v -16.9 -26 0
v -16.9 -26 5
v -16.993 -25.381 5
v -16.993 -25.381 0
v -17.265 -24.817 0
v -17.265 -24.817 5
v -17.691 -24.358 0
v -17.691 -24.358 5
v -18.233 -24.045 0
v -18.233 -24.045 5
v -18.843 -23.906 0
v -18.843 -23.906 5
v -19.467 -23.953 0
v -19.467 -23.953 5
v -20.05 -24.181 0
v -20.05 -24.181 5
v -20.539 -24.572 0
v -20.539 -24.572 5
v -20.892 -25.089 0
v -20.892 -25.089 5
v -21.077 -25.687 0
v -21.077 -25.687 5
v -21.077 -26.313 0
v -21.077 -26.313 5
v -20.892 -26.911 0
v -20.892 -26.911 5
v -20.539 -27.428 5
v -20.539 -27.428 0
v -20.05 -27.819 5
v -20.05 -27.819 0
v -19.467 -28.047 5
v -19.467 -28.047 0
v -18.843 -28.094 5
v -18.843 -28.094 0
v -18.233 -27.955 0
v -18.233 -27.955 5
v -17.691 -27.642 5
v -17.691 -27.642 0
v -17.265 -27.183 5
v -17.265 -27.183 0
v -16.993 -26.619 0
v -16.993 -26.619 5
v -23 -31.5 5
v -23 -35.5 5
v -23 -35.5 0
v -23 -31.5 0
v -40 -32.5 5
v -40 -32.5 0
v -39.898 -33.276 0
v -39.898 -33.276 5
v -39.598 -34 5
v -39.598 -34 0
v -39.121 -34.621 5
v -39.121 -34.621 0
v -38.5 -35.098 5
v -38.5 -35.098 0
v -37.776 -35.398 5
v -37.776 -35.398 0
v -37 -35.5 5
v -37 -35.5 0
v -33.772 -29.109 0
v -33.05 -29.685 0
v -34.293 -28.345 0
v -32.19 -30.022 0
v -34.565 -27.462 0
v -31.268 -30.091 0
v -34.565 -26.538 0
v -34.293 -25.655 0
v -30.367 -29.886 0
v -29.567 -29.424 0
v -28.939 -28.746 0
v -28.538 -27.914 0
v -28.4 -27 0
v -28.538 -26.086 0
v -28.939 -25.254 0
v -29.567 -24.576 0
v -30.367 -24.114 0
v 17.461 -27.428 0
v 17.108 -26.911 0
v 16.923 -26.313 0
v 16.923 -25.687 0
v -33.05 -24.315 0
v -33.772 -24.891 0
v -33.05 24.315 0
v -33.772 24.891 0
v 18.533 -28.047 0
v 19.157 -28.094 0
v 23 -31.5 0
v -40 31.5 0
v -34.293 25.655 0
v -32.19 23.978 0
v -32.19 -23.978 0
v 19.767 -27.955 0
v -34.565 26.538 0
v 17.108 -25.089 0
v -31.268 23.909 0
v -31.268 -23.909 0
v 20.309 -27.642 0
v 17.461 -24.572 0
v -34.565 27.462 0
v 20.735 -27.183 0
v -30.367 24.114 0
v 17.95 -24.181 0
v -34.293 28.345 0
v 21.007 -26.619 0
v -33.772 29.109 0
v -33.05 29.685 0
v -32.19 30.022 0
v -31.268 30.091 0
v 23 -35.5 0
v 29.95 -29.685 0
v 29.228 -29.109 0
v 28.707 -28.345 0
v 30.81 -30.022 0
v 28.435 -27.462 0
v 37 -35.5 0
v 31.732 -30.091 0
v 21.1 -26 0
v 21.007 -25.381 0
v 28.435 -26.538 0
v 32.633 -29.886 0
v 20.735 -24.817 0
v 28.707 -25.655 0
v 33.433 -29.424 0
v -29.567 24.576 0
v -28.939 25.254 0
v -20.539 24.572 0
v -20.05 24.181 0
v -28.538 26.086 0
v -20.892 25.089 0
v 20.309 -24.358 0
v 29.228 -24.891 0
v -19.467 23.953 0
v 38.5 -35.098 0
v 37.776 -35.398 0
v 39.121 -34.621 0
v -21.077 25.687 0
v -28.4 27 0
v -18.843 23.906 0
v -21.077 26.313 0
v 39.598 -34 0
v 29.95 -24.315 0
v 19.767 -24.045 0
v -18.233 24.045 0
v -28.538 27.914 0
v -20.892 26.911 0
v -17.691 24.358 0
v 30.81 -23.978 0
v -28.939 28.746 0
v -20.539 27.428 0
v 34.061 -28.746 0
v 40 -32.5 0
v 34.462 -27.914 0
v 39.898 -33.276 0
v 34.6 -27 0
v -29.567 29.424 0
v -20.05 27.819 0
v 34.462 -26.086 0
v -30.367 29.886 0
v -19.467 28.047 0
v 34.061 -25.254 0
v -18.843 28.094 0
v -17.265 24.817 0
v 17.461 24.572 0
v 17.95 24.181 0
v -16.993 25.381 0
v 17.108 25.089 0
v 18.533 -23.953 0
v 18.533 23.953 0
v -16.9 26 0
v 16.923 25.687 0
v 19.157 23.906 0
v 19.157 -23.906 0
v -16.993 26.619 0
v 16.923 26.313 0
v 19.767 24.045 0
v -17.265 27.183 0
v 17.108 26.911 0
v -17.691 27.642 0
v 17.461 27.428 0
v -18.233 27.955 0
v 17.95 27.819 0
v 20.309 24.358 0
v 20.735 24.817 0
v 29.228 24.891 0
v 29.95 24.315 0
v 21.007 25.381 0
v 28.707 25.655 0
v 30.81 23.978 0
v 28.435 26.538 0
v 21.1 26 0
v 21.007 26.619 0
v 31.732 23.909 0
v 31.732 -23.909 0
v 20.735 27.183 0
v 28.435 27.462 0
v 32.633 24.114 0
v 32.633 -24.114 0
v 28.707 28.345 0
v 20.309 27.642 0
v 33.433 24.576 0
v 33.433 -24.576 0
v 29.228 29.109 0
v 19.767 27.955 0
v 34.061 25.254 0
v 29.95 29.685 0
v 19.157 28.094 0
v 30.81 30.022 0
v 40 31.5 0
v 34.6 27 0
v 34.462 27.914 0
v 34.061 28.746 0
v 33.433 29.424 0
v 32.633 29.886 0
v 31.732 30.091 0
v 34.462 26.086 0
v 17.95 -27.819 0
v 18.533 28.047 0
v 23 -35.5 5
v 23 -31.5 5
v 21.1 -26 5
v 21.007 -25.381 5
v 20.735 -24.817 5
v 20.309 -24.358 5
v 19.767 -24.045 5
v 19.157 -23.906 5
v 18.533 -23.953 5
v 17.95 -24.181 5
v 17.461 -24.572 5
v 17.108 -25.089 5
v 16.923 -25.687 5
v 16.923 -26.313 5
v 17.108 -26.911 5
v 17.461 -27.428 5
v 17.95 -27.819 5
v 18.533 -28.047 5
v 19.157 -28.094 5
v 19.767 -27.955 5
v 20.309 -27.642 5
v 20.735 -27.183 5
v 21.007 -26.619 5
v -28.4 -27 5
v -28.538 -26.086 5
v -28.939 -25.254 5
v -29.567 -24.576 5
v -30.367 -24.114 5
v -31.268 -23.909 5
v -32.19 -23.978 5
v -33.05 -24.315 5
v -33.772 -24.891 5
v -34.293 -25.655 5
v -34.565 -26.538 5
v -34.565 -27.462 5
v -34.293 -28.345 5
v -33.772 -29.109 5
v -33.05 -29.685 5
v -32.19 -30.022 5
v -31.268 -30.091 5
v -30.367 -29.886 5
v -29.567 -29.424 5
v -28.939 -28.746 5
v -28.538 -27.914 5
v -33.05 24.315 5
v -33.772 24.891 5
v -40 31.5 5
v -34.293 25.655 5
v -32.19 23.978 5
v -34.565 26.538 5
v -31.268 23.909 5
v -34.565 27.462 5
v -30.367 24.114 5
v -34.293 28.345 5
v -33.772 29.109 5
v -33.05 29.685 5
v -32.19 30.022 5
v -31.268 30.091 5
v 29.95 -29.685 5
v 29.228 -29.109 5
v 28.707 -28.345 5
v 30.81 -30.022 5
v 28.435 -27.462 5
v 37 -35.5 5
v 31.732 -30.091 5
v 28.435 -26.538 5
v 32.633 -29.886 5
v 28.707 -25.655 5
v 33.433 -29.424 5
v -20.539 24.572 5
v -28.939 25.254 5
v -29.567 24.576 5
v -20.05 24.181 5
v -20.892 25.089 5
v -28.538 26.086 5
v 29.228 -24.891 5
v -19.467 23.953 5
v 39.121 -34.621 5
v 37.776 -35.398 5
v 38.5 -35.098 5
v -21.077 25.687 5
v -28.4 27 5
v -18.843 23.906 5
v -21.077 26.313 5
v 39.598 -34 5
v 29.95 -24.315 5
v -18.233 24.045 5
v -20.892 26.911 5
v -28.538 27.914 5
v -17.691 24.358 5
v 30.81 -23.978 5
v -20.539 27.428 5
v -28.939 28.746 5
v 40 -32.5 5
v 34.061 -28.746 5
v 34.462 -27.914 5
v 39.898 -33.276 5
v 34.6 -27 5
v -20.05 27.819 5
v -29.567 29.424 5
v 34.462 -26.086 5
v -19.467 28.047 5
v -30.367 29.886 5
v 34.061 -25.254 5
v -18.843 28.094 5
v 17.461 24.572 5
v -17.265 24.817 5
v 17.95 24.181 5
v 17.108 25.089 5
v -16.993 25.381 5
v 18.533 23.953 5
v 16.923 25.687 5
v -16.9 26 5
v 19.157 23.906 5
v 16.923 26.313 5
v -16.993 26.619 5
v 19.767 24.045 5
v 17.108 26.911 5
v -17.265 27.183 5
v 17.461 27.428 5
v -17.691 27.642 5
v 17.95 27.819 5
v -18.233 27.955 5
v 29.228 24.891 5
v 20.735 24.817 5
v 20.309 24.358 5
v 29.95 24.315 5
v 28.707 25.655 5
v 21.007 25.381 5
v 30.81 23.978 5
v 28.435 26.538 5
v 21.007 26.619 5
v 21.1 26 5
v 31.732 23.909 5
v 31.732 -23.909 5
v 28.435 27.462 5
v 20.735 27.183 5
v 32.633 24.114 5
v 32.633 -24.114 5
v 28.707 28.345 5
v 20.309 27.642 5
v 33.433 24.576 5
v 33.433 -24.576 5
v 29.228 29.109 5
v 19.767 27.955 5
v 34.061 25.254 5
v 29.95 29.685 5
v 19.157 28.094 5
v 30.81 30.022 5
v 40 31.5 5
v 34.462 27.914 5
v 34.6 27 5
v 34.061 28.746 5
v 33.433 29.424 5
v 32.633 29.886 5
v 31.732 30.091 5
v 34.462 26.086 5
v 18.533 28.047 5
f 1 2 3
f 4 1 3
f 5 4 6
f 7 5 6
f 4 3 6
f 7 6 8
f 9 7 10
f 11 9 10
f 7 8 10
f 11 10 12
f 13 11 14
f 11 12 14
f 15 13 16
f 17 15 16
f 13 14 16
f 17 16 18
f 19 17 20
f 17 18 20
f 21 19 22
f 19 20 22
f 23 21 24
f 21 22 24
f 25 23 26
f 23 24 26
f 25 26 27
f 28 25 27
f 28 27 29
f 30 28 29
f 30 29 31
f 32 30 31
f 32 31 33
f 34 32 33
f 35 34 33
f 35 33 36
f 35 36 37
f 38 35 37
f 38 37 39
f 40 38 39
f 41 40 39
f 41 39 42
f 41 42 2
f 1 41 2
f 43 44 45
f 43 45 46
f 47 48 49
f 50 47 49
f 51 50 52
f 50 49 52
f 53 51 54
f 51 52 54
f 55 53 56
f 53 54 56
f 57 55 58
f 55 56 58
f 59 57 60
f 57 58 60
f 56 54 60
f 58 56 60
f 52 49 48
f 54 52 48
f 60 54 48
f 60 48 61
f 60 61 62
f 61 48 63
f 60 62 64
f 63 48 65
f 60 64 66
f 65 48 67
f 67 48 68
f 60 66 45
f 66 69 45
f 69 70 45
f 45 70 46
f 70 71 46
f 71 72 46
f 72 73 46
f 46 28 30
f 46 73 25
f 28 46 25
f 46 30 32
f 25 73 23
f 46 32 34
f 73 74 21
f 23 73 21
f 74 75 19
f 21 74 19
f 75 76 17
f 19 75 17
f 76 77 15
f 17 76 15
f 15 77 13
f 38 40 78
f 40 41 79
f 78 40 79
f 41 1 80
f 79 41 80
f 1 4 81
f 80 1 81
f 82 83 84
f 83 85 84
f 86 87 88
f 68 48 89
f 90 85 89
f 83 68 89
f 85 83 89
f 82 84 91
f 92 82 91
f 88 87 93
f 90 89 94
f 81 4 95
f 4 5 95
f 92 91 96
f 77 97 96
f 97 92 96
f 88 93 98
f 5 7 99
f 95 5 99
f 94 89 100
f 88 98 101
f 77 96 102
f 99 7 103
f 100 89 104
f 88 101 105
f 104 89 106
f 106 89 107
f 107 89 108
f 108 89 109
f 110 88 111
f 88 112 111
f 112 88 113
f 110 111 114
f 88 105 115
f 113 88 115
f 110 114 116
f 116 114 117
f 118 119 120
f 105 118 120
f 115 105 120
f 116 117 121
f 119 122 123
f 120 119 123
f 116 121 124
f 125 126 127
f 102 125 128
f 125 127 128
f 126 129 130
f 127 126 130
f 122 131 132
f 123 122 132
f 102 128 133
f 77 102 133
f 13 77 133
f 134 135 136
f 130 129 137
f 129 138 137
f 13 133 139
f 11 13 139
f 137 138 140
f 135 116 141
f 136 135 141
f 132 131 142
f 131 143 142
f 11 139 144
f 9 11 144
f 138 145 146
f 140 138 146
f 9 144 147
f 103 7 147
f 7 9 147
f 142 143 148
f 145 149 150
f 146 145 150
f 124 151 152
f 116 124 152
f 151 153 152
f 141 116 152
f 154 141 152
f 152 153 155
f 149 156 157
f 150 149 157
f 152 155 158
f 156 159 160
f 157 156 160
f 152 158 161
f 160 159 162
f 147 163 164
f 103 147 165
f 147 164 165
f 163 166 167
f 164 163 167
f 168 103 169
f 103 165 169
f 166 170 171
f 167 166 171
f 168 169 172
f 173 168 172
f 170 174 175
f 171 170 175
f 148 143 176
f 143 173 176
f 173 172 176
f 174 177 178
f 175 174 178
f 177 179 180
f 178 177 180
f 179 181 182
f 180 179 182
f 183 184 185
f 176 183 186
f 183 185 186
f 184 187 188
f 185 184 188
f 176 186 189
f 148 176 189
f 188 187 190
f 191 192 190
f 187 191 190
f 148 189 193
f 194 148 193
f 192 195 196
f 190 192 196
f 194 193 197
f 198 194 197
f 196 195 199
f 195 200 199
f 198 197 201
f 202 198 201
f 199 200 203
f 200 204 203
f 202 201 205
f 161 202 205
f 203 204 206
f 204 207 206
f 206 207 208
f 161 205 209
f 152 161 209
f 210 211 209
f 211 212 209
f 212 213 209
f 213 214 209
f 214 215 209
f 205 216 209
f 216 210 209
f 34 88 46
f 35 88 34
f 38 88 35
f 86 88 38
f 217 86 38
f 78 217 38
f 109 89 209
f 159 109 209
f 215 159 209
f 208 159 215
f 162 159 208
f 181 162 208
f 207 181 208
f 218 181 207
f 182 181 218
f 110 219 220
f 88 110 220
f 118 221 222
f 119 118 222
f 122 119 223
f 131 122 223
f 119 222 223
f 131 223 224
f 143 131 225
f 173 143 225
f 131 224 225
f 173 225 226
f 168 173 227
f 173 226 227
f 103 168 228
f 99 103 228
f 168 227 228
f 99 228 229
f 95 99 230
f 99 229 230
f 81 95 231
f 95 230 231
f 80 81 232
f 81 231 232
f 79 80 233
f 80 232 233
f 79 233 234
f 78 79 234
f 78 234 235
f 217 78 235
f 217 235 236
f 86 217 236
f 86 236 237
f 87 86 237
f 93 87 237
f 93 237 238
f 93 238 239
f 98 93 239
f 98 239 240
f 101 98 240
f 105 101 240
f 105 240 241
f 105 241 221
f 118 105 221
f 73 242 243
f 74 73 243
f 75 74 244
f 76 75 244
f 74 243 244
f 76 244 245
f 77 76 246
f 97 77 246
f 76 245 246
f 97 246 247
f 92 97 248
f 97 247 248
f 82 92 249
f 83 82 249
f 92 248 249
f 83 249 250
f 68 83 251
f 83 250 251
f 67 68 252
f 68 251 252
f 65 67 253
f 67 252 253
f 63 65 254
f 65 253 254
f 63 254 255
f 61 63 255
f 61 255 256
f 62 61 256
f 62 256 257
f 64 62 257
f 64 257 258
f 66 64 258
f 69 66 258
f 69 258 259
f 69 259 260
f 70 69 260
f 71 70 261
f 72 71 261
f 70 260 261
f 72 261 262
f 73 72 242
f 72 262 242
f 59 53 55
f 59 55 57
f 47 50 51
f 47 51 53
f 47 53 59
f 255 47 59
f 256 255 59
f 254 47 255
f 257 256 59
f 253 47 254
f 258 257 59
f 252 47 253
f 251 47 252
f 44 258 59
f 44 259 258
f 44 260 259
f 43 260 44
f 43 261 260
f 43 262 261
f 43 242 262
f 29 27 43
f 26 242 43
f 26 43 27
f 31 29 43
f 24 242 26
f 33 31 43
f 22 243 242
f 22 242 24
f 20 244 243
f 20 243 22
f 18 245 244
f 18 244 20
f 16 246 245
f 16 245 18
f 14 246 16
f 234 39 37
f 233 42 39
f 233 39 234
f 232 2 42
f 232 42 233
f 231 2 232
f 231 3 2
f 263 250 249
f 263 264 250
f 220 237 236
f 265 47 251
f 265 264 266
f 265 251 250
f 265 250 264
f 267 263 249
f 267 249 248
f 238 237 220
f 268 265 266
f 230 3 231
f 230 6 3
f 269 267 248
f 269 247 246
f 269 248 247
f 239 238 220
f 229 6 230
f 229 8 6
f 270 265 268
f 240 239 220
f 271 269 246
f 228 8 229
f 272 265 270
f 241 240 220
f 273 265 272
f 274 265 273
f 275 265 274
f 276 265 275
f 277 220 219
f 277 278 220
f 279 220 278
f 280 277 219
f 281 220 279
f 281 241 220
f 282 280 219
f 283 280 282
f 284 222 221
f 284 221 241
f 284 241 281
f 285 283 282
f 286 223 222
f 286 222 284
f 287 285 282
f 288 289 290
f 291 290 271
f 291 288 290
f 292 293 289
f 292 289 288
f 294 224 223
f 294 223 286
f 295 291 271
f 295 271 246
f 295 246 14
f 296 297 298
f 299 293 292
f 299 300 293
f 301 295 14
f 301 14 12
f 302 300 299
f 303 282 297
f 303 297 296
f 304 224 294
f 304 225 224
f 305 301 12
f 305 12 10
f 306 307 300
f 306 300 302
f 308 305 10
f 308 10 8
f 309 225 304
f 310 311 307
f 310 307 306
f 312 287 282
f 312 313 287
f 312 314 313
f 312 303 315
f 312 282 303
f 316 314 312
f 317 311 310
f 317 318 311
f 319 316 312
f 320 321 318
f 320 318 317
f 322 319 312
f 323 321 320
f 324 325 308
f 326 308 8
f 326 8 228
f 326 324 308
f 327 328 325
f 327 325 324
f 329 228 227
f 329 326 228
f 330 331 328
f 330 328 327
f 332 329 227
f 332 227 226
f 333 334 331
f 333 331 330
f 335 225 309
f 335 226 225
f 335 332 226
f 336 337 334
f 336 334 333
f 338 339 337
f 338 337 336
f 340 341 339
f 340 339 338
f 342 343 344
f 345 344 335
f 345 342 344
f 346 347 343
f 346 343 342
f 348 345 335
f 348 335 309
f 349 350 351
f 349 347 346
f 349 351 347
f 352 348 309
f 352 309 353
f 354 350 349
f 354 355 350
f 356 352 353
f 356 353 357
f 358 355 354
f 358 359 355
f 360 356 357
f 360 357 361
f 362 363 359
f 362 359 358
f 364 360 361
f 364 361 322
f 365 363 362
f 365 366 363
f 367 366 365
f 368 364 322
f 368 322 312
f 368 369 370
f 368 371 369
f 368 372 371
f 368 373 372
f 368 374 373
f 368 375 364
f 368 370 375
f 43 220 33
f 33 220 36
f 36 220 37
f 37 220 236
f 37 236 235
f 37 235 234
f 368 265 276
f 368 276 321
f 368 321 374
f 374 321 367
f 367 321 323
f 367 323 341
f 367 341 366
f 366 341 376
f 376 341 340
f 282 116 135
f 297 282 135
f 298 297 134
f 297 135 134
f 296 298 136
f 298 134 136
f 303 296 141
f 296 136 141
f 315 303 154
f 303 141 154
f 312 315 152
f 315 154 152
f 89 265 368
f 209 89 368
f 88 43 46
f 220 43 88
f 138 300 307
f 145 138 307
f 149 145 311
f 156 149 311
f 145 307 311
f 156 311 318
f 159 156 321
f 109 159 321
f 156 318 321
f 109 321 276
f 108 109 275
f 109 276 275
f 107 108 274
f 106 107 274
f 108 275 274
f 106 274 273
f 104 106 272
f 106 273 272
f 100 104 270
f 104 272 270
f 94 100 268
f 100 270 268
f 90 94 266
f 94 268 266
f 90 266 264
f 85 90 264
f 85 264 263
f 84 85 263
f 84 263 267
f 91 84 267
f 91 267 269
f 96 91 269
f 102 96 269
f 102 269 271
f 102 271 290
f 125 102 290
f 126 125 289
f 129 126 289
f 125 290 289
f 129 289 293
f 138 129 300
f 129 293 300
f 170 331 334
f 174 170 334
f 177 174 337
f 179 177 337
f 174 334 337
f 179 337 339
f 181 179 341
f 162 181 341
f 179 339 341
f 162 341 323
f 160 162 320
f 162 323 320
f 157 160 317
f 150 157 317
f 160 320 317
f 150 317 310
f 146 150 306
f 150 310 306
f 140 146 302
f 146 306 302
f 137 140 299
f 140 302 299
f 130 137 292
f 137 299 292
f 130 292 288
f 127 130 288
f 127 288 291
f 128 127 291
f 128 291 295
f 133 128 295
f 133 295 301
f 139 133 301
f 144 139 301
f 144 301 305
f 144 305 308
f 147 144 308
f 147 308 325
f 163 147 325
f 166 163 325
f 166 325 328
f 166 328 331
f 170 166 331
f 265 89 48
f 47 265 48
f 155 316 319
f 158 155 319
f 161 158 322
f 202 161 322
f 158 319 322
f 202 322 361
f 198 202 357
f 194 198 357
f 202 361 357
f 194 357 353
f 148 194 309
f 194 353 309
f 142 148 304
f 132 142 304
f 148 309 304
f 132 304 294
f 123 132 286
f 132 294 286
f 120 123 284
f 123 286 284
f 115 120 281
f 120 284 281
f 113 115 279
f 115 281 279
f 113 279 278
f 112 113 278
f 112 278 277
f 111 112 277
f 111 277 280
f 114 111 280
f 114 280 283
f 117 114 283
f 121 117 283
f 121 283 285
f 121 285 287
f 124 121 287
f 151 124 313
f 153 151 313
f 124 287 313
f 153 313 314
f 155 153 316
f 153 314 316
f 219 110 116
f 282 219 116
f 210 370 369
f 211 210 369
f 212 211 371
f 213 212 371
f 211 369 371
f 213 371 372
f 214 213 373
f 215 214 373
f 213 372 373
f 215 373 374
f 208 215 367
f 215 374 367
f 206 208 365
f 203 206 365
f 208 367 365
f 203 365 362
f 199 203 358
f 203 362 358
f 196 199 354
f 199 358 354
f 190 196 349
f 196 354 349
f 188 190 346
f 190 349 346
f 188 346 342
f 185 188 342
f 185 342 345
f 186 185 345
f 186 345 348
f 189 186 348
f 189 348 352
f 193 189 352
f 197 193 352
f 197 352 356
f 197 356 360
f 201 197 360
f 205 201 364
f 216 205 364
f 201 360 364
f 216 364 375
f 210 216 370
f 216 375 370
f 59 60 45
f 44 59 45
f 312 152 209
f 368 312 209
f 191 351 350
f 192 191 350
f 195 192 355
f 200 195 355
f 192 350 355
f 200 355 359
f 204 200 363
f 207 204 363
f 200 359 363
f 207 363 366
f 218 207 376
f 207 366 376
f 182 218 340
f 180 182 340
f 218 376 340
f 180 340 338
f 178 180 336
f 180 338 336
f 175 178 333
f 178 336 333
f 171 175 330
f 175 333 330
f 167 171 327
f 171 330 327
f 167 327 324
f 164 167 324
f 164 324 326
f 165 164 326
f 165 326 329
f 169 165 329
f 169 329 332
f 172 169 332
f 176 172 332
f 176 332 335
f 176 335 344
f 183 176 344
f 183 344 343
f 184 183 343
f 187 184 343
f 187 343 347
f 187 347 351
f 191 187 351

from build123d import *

# Parameters (mm, degrees)
EXTRUDE_1_DEPTH     = 5
SKETCH_2_R          = 3.1
CUT_EXTRUDE_1_DEPTH = 5
SKETCH_3_W          = 46
SKETCH_3_H          = 8
SKETCH_3_W_2        = 80
CUT_EXTRUDE_2_DEPTH = 5
SKETCH_4_R          = 2.1
CUT_EXTRUDE_3_DEPTH = 54.714523176


with BuildPart() as part:
    # 草图1 → 凸台-拉伸1 (new body)
    with BuildSketch(Plane.XY):
        with BuildLine():
            Line((-37, -35.5), (37, -35.5))
            ThreePointArc((37, -35.5), (39.121320344, -34.621320344), (40, -32.5))
            Line((40, -32.5), (40, 32.5))
            ThreePointArc((40, 32.5), (39.121320344, 34.621320344), (37, 35.5))
            Line((37, 35.5), (-37, 35.5))
            ThreePointArc((-37, 35.5), (-39.121320344, 34.621320344), (-40, 32.5))
            Line((-40, 32.5), (-40, -32.5))
            ThreePointArc((-40, -32.5), (-39.121320344, -34.621320344), (-37, -35.5))
        make_face()
    extrude(amount=EXTRUDE_1_DEPTH)

    # 草图2 → 切除-拉伸1 (cut)
    with BuildSketch(Plane.XY.offset(5)):
        with Locations((-31.5, 27)):
            Circle(SKETCH_2_R)
        with Locations((31.5, 27)):
            Circle(SKETCH_2_R)
        with Locations((31.5, -27)):
            Circle(SKETCH_2_R)
        with Locations((-31.5, -27)):
            Circle(SKETCH_2_R)
    extrude(amount=-CUT_EXTRUDE_1_DEPTH, mode=Mode.SUBTRACT)

    # 草图3 → 切除-拉伸2 (cut)
    with BuildSketch(Plane.XY.offset(5)):
        with Locations((0, -35.5)):
            Rectangle(SKETCH_3_W, SKETCH_3_H)
        with Locations((0, 35.5)):
            Rectangle(SKETCH_3_W_2, SKETCH_3_H)
    extrude(amount=-CUT_EXTRUDE_2_DEPTH, mode=Mode.SUBTRACT)

    # 草图4 → 切除-拉伸3 (cut, through all)
    with BuildSketch(Plane.XY.offset(5)):
        with Locations((19, -26)):
            Circle(SKETCH_4_R)
        with Locations((-19, -26)):
            Circle(SKETCH_4_R)
        with Locations((-19, 26)):
            Circle(SKETCH_4_R)
        with Locations((19, 26)):
            Circle(SKETCH_4_R)
    extrude(amount=-CUT_EXTRUDE_3_DEPTH, mode=Mode.SUBTRACT)


solid = part.part
